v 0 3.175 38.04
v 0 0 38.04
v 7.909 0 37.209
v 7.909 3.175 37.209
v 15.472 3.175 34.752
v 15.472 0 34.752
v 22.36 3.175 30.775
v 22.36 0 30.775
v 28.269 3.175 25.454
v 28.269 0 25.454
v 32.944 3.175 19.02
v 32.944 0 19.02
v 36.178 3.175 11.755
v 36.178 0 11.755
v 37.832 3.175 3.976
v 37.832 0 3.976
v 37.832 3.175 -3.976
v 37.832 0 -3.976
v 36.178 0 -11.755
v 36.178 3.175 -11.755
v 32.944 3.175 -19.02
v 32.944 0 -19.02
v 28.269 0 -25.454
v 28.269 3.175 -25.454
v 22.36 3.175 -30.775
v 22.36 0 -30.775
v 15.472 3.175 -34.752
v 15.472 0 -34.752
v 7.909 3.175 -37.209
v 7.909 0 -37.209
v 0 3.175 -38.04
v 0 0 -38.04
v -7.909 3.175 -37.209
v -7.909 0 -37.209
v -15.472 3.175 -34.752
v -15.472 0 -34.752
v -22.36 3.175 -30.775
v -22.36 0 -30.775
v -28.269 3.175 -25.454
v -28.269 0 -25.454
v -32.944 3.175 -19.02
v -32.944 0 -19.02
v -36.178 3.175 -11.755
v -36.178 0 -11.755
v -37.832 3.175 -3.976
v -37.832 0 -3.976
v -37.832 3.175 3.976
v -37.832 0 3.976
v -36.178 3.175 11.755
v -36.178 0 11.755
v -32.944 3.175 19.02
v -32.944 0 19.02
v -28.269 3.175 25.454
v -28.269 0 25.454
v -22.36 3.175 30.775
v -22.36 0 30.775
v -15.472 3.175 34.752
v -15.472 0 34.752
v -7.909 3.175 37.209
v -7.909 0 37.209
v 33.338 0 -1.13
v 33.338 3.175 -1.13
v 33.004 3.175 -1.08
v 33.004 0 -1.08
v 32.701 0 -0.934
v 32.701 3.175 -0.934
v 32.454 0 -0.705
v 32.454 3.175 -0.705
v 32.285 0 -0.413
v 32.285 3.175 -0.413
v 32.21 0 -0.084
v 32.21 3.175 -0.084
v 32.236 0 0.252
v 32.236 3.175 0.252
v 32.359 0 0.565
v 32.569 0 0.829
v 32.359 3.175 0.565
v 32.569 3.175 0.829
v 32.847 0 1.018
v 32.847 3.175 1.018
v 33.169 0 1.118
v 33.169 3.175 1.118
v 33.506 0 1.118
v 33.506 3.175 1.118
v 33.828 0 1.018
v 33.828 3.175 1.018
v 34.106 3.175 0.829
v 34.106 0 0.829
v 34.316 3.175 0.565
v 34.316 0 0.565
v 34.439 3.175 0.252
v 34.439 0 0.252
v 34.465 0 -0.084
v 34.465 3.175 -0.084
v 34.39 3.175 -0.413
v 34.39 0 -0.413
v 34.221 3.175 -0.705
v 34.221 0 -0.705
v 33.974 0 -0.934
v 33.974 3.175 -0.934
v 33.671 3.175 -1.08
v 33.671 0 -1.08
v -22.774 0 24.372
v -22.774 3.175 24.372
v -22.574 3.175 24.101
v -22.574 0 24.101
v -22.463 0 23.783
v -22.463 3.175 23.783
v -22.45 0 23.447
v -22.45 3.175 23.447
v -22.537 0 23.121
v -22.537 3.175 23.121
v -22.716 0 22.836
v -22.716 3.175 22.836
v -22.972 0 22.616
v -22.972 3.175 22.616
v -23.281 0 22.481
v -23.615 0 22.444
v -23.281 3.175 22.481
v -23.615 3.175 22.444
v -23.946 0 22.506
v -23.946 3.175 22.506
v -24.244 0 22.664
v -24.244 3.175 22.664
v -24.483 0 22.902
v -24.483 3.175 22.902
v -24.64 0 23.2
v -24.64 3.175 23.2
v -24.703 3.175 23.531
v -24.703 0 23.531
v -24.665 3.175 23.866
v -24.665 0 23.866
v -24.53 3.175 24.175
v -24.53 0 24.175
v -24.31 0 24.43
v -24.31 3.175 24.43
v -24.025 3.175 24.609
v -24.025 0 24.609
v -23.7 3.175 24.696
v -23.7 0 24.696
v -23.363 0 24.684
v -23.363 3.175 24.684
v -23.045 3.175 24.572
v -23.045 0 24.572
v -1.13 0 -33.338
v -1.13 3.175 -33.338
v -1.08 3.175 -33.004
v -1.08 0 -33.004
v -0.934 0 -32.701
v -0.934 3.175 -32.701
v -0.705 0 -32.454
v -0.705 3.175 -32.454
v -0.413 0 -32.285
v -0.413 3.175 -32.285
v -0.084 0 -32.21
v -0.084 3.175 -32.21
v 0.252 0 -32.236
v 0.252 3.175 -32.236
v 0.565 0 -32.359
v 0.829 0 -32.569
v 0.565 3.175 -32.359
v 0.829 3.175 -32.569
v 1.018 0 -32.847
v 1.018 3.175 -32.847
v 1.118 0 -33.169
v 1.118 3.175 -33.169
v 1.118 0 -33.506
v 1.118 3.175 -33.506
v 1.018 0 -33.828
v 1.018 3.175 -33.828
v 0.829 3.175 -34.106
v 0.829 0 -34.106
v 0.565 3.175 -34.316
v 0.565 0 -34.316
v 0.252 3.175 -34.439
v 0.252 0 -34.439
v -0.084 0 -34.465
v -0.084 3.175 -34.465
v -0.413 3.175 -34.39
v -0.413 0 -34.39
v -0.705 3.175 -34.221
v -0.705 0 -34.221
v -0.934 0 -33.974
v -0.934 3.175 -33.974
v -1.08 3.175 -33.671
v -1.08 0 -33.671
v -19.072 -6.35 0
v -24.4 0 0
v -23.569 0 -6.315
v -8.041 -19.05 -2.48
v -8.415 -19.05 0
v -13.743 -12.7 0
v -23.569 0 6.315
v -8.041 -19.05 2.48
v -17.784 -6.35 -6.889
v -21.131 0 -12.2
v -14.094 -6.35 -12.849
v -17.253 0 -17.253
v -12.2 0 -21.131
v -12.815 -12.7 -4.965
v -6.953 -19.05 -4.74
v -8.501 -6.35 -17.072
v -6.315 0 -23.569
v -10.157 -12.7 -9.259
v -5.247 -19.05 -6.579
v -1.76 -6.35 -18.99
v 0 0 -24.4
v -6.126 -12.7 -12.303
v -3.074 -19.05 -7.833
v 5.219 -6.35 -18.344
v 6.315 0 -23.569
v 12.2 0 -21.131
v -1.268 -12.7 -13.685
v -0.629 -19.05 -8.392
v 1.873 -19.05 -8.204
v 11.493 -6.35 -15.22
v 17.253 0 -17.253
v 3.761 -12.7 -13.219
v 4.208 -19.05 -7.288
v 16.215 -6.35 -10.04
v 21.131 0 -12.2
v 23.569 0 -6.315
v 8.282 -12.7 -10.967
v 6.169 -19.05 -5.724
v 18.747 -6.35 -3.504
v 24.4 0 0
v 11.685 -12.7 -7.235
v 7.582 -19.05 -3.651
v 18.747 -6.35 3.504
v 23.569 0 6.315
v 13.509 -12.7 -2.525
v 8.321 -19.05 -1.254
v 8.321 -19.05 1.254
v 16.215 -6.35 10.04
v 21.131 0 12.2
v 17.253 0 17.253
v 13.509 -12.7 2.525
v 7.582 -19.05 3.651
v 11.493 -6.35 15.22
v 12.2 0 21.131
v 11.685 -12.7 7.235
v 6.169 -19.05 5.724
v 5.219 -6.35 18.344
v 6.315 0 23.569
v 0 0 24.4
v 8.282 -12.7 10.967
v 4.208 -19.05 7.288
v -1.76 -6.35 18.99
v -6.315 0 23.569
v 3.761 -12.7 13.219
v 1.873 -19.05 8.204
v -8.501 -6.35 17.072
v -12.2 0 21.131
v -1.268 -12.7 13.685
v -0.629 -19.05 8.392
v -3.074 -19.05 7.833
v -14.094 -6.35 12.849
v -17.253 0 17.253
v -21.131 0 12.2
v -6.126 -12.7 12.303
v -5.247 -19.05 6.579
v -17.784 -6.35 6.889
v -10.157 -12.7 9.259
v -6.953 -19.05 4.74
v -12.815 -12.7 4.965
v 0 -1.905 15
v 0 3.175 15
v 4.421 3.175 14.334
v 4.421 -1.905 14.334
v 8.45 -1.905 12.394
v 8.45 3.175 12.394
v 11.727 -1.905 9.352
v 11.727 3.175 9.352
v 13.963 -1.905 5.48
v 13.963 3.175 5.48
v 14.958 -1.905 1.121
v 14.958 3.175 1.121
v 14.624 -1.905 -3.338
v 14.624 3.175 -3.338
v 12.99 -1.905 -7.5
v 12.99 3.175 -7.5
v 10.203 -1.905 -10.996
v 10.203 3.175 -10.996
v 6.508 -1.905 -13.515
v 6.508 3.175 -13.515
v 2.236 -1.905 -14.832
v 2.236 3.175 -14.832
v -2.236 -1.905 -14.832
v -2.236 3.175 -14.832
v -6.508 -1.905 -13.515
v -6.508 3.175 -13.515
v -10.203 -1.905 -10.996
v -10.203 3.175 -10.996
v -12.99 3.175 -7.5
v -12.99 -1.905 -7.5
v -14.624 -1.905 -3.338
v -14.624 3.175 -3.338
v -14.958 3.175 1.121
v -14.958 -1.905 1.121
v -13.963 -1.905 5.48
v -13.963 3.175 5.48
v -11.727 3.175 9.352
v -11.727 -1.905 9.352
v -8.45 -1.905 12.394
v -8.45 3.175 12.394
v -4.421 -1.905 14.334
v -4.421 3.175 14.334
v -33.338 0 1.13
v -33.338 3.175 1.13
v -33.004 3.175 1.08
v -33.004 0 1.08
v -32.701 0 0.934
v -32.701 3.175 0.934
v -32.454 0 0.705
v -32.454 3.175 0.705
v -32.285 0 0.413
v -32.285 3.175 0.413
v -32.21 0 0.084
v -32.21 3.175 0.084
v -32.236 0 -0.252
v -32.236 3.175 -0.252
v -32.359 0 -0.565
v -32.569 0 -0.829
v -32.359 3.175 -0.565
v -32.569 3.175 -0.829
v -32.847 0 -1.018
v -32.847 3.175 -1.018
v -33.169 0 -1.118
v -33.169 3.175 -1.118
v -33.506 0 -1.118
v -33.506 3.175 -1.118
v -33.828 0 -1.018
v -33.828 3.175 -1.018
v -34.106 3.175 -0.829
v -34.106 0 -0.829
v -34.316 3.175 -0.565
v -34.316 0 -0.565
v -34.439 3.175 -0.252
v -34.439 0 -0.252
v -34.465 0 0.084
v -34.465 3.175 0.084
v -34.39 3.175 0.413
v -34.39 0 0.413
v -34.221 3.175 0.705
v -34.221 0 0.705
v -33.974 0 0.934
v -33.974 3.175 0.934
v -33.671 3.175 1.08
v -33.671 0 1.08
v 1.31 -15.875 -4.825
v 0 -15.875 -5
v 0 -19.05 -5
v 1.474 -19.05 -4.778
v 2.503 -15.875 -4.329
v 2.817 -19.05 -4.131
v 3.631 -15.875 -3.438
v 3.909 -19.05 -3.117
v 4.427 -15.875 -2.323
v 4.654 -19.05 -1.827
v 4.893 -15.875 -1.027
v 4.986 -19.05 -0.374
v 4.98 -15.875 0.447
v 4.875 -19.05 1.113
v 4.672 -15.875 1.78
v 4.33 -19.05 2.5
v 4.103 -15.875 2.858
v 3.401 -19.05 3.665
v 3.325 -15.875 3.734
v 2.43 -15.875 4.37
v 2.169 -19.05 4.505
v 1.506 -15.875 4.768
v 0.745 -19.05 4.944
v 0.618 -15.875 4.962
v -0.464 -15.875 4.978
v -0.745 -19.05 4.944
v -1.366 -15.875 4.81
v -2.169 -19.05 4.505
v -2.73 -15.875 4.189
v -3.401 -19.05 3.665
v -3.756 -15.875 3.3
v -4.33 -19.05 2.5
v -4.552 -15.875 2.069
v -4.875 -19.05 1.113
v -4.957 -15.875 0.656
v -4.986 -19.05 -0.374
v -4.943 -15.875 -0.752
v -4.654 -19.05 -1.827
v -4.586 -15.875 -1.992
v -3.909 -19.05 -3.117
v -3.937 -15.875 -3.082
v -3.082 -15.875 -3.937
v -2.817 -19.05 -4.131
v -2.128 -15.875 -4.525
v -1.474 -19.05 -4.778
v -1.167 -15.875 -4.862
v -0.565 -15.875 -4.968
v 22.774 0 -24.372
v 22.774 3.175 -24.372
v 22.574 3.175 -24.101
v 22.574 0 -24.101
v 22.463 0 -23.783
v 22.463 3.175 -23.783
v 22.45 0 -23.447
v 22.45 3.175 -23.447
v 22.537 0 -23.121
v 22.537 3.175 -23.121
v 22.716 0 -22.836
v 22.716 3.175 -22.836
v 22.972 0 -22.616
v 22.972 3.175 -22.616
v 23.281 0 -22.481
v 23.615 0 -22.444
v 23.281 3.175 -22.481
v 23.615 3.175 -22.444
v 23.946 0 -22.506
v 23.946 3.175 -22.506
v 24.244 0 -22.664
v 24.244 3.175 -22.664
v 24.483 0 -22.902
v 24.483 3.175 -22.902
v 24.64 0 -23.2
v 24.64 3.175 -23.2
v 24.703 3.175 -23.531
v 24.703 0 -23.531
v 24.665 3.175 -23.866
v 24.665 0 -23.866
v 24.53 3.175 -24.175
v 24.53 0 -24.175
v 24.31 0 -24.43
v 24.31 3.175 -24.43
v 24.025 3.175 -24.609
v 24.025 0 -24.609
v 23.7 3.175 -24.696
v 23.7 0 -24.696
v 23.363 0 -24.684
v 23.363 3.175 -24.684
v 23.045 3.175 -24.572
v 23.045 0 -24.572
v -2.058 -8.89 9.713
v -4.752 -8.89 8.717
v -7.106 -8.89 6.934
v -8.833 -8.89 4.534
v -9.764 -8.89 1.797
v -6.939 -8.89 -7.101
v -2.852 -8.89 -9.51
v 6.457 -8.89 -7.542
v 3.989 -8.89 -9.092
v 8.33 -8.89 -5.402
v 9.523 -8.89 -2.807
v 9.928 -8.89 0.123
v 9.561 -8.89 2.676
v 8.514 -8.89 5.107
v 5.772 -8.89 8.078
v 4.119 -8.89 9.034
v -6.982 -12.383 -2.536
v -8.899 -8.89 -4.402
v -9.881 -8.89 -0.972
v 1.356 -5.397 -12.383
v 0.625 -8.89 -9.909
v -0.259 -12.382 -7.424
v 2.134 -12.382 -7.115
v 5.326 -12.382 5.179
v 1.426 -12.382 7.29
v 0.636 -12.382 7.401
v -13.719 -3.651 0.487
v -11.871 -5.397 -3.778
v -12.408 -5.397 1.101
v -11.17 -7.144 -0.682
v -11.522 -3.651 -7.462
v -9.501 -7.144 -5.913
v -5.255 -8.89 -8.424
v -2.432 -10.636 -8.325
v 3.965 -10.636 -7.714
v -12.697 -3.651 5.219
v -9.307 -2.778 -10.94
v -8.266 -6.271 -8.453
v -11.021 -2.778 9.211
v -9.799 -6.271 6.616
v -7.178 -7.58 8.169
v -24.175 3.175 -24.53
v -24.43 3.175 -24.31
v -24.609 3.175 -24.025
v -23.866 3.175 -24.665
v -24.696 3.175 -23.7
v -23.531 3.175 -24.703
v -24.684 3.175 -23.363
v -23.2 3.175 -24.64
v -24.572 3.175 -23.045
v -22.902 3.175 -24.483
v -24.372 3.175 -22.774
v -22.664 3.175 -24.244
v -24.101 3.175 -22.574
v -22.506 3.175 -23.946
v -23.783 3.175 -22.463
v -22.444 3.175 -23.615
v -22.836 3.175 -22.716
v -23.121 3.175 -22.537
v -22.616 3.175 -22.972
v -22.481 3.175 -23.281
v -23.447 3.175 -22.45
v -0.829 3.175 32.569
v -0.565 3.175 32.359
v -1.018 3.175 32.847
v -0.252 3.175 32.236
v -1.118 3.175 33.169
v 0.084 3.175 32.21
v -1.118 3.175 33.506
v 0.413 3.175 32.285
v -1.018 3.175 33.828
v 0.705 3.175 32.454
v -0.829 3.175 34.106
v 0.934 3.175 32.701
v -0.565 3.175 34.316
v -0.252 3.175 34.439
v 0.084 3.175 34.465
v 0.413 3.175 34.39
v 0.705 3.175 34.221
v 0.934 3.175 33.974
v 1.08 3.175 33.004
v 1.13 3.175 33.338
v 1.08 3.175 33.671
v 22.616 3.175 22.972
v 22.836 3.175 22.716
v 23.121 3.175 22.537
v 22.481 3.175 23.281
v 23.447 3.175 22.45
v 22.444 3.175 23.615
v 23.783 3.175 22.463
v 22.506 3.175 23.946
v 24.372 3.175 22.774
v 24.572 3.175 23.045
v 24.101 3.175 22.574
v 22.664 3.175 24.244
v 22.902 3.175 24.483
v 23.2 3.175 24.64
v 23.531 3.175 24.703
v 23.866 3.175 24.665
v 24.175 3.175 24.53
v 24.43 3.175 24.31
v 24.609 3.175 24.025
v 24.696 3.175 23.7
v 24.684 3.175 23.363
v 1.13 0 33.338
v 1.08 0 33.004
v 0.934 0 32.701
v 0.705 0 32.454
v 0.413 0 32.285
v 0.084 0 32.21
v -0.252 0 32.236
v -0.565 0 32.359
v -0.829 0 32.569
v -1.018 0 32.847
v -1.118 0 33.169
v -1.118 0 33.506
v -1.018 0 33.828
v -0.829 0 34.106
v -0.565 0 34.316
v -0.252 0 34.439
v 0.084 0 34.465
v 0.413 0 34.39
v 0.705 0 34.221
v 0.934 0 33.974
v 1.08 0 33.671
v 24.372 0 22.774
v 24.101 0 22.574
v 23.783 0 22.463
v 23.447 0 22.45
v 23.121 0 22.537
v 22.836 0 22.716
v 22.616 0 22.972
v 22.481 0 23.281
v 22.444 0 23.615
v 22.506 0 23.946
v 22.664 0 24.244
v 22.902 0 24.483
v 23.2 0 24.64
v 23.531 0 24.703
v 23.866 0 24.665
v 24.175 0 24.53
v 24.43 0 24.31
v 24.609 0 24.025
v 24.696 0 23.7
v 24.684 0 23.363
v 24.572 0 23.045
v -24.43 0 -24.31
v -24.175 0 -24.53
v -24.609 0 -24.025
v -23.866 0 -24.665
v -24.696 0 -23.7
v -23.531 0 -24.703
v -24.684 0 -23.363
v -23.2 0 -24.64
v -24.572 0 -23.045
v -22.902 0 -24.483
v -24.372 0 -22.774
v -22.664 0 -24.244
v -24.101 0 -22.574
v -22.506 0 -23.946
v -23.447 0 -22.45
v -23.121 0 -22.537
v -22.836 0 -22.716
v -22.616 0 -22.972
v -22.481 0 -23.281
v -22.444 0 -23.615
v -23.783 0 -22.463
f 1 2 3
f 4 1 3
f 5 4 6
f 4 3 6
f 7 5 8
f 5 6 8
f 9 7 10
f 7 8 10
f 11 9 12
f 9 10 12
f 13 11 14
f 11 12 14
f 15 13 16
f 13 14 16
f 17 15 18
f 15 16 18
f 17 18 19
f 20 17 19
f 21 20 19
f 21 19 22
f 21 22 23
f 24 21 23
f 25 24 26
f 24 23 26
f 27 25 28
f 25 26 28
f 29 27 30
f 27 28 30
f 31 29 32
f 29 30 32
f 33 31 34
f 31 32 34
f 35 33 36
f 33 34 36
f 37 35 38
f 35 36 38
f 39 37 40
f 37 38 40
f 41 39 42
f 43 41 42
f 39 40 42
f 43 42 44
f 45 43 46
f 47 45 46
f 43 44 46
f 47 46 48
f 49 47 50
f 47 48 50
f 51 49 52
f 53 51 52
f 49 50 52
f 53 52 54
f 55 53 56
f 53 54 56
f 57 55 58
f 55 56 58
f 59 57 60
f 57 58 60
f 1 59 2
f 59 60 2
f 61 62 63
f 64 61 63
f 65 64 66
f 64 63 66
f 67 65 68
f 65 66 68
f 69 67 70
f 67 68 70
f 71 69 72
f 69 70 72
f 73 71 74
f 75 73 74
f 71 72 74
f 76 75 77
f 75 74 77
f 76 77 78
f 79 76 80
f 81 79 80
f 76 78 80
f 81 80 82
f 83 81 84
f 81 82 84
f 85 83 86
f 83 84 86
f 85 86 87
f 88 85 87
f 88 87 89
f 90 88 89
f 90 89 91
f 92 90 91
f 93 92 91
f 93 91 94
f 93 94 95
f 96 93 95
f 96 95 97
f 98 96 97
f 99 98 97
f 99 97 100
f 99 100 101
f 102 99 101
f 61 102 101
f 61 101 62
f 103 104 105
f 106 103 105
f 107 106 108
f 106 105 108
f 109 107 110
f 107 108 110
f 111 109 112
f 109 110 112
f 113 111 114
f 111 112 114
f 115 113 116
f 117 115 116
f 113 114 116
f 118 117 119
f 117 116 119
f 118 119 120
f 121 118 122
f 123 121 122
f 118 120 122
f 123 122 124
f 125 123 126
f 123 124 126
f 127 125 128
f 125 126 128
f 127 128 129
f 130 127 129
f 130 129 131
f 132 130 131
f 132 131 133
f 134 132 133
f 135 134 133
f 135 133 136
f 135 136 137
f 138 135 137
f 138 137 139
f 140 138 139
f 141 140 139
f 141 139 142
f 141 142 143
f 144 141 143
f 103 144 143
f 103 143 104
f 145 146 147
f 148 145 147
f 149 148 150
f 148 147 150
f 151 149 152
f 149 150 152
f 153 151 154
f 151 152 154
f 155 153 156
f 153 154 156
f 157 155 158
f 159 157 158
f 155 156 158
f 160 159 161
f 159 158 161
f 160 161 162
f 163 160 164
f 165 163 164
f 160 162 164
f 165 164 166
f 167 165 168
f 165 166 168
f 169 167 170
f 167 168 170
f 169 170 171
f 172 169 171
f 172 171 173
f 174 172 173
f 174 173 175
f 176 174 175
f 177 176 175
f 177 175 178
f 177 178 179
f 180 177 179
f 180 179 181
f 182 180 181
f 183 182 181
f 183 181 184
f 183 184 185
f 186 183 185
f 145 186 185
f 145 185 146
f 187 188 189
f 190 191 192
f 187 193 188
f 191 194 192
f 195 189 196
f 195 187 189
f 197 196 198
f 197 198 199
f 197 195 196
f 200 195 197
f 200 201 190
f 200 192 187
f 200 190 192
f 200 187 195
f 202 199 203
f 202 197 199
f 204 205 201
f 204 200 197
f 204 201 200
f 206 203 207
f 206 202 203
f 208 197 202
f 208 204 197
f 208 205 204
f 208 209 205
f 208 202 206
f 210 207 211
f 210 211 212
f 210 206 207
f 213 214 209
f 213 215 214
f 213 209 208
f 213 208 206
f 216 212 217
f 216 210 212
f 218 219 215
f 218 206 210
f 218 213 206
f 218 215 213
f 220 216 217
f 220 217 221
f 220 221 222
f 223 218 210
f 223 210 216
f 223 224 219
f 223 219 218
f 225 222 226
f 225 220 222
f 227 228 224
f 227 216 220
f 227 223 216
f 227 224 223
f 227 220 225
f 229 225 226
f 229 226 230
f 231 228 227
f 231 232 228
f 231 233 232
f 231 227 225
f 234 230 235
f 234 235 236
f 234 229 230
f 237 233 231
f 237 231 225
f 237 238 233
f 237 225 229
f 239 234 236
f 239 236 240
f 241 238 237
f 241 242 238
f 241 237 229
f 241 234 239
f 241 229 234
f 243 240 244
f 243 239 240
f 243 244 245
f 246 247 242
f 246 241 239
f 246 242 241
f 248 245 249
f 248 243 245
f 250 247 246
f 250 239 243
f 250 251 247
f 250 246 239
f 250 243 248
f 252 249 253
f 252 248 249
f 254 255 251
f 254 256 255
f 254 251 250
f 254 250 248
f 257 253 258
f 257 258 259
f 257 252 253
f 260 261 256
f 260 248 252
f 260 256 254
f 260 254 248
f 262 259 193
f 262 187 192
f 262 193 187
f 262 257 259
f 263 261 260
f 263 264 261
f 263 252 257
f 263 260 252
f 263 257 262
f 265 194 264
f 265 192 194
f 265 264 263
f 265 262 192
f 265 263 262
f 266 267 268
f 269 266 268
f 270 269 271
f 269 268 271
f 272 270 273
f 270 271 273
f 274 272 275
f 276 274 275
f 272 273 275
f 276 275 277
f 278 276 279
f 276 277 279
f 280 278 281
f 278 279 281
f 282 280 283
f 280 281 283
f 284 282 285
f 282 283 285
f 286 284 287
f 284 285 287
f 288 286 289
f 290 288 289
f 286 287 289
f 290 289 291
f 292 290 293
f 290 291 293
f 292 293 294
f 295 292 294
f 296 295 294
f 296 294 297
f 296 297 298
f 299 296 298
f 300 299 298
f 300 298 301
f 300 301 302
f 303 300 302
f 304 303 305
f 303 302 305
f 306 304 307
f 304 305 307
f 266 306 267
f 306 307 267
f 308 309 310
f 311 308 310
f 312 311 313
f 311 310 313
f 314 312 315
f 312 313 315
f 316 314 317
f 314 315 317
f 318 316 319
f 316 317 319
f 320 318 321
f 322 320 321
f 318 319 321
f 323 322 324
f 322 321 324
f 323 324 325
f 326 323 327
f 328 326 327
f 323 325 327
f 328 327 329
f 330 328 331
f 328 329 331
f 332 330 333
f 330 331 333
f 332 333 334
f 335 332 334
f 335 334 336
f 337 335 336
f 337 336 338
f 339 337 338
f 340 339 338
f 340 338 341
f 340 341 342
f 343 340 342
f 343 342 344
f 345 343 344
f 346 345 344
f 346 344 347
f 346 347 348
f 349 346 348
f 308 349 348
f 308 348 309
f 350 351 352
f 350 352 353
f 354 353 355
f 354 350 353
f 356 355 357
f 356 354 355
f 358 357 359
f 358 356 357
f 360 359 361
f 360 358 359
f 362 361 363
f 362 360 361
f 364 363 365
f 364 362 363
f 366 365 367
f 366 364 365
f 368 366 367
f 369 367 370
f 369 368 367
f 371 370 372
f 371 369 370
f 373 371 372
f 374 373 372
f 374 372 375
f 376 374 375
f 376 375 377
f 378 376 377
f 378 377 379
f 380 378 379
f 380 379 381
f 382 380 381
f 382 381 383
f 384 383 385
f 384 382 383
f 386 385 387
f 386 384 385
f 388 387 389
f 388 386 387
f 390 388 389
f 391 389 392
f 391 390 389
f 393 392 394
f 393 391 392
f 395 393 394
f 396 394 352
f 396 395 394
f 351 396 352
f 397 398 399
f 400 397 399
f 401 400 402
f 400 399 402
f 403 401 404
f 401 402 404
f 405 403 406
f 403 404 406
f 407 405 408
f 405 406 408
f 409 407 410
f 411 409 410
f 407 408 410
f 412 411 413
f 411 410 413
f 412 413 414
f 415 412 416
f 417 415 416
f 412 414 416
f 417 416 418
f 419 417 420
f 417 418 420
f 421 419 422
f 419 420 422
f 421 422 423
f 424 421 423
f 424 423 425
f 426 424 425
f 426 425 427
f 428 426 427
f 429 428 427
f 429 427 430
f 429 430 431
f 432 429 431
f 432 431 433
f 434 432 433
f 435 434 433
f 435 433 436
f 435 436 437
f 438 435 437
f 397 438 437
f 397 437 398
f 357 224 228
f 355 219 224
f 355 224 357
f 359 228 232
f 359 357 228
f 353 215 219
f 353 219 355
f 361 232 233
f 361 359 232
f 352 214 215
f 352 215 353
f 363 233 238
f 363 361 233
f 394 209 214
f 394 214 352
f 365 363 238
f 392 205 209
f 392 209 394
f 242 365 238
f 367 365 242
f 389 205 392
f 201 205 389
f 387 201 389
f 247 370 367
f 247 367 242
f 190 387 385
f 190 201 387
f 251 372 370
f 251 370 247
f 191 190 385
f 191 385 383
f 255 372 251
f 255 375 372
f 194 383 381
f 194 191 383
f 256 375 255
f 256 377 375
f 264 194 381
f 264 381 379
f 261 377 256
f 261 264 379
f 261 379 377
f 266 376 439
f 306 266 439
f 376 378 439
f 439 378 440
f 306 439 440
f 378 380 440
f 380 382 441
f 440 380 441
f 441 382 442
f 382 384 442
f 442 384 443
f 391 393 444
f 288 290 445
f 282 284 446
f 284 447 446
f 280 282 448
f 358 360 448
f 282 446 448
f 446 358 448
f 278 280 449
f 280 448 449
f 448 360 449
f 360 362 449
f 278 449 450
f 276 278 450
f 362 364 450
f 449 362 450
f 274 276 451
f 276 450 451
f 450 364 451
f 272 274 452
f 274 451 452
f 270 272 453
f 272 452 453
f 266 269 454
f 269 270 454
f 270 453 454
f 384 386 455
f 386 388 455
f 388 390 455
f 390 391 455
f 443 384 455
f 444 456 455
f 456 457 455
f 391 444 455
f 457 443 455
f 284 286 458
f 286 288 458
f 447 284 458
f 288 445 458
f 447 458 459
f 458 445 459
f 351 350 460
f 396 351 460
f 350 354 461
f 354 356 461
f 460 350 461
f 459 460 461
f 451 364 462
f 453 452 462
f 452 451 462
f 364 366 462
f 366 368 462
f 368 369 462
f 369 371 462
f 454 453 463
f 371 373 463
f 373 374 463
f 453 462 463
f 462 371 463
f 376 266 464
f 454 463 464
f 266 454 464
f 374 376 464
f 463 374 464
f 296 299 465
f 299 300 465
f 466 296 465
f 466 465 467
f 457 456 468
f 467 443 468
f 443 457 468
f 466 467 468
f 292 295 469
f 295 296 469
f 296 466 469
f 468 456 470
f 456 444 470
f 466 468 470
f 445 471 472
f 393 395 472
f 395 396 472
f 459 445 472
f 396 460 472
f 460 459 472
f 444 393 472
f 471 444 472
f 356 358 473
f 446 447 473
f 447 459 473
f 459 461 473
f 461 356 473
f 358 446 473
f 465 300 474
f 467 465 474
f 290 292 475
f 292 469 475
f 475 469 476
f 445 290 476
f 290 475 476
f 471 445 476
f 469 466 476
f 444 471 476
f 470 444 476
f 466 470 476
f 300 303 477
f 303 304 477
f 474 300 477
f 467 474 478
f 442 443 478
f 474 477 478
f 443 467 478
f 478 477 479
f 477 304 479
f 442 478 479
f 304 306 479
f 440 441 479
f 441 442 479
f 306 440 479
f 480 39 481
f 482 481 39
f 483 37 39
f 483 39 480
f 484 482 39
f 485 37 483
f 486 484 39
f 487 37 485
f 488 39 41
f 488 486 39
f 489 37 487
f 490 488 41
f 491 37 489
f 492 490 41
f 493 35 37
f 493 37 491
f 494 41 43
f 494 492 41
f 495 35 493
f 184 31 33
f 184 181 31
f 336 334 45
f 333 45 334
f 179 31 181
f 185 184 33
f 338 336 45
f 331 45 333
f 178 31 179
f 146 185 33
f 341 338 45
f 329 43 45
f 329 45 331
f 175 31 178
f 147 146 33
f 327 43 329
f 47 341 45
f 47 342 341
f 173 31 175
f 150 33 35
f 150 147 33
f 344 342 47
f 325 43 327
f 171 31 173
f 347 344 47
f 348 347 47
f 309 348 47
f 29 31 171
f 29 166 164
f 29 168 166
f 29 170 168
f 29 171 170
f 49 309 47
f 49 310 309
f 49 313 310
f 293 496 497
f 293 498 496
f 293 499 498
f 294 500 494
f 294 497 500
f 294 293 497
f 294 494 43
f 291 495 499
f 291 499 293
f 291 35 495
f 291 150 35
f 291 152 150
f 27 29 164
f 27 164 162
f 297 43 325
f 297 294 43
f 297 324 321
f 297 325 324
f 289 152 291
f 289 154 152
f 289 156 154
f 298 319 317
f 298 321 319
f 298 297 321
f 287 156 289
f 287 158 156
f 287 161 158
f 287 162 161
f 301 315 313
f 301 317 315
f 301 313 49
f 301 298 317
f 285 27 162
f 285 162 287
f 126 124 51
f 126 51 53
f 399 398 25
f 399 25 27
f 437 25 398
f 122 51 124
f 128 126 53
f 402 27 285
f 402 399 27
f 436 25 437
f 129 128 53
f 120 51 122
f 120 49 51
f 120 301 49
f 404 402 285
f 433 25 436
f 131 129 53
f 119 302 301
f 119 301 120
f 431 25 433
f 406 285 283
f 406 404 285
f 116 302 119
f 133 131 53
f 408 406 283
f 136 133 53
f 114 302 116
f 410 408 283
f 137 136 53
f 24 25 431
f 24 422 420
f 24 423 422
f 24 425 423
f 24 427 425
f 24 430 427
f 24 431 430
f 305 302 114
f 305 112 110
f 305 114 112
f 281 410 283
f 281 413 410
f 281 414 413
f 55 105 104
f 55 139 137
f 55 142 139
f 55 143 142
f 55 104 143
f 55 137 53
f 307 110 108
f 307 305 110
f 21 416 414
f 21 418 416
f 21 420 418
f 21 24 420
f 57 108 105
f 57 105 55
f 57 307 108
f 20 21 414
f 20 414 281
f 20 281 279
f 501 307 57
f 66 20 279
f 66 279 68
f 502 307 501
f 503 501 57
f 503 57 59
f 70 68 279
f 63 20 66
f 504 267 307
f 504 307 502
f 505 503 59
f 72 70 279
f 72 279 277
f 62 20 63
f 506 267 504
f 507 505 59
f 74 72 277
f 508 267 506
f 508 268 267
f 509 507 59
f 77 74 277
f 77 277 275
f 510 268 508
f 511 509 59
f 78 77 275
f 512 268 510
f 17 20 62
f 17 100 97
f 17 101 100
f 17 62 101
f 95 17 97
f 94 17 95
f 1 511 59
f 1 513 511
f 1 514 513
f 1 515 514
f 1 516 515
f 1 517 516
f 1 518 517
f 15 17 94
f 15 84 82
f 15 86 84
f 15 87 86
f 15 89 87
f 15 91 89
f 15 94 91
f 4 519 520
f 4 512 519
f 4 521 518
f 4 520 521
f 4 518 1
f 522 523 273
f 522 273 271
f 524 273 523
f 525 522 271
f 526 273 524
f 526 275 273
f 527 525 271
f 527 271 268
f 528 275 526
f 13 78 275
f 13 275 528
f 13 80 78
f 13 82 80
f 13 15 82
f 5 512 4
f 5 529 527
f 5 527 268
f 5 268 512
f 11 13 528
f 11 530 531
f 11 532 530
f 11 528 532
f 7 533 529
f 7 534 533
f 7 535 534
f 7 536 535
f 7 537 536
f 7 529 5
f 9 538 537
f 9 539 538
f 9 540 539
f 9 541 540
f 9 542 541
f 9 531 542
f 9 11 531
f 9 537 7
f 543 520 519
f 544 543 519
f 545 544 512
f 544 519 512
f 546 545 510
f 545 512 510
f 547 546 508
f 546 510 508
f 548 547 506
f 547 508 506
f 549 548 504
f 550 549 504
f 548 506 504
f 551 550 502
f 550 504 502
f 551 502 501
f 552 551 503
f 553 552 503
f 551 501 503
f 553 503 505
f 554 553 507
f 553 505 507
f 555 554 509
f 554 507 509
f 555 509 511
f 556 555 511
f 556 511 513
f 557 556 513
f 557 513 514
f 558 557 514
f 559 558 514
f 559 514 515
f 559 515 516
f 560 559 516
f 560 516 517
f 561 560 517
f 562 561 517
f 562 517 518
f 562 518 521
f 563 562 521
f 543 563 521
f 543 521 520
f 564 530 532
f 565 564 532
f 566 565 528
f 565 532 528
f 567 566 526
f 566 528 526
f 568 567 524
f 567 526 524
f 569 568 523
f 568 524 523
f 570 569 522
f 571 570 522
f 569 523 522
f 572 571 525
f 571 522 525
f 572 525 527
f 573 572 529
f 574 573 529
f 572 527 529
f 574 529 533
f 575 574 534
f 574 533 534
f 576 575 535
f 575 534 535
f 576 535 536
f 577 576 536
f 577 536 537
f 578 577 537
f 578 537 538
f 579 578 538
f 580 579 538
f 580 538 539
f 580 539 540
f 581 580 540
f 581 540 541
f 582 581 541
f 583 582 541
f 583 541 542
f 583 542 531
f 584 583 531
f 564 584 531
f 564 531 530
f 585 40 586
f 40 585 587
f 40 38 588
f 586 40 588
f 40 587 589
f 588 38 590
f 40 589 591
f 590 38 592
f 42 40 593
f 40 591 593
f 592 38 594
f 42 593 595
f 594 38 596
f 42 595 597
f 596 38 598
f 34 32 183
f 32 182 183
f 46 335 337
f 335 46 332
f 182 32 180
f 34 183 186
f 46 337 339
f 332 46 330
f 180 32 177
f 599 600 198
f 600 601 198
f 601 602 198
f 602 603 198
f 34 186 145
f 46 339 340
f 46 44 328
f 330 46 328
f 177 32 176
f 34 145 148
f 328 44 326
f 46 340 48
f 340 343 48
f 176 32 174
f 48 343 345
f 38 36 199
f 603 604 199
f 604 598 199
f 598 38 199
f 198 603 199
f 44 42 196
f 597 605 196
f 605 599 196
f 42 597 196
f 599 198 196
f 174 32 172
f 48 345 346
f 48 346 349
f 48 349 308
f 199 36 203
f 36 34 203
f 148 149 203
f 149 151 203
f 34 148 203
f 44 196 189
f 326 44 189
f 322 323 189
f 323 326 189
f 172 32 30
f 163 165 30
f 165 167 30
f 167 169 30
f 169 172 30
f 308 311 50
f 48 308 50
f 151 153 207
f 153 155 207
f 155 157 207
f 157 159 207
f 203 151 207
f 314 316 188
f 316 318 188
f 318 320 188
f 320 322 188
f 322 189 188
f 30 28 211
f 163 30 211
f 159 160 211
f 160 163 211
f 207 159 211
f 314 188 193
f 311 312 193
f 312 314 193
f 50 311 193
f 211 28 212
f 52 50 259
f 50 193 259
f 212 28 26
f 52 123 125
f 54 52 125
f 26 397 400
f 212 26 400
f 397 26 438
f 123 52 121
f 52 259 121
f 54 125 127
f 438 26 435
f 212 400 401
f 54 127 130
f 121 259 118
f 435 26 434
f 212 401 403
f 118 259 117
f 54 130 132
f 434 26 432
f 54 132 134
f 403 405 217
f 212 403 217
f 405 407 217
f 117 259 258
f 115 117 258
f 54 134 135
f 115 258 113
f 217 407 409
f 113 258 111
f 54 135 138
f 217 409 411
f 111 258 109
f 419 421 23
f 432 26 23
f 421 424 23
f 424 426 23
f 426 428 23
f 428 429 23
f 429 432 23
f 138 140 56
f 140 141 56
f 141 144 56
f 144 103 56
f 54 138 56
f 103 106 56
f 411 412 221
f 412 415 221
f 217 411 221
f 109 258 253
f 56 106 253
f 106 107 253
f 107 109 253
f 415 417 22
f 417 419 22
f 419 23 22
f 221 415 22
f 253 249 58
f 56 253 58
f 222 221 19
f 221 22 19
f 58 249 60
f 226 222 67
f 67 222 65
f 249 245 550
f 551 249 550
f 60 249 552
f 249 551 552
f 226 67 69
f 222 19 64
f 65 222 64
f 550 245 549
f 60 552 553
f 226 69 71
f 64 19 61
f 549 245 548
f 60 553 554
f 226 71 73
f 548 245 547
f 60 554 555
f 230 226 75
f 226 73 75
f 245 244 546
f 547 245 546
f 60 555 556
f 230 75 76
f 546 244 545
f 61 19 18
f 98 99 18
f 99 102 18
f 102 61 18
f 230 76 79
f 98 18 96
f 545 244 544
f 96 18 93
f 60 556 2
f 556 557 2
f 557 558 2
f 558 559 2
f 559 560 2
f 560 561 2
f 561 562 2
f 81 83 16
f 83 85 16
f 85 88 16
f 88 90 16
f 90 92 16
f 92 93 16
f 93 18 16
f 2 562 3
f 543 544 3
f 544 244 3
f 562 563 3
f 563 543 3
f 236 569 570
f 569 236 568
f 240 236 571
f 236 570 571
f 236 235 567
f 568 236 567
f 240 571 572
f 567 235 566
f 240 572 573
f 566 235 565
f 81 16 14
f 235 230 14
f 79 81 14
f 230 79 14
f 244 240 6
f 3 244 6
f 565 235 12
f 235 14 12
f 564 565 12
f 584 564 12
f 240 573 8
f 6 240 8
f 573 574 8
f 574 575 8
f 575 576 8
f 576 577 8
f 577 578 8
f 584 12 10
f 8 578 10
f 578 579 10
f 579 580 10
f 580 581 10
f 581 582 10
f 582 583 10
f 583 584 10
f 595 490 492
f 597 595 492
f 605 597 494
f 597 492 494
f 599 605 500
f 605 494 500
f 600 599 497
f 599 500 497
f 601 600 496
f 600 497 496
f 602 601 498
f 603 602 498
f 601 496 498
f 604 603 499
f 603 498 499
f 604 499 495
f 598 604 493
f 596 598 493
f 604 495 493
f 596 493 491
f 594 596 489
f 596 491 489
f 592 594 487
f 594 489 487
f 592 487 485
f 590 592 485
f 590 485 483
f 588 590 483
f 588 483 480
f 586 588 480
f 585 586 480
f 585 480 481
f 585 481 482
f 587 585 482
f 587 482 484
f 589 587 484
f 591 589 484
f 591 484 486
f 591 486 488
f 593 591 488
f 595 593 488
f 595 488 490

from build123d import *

# Parameters (mm, degrees)
SKETCH1_R                 = 38.04031
BOSS_EXTRUDE1_DEPTH       = 3.175
TAP_DRILL_FOR_4_40_TAP1_D = 2.2606
CIRPATTERN1_COUNT         = 8
SKETCH5_R                 = 25.4
BOSS_EXTRUDE2_DEPTH       = 19.05
CUT_EXTRUDE1_DEPTH        = 59.207224593
CUT_EXTRUDE1_DEPTH_BACK   = 59.207224593
SKETCH6_R                 = 5
SKETCH7_R                 = 15
CUT_EXTRUDE2_DEPTH        = 5.08


with BuildPart() as part:
    # Sketch1 → Boss-Extrude1 (new body)
    with BuildSketch(Plane(origin=(0, 0, 0), x_dir=(1, 0, 0), z_dir=(0, 1, 0))):
        with Locations(Location((0, 0, 0), (0, 0, 270))):
            Circle(SKETCH1_R)
    extrude(amount=BOSS_EXTRUDE1_DEPTH)

    # Tap Drill for #4-40 Tap1 (through all)
    with Locations(Plane(origin=(0, 0, 0), x_dir=(-1, 0, 0), z_dir=(0, -1, 0))):
        with Locations((0, -33.3375)):
            tap_drill_for_4_40_tap1 = Hole(TAP_DRILL_FOR_4_40_TAP1_D / 2)

    # CirPattern1: Tap Drill for #4-40 Tap1 ×8 about axis
    cirpattern1_axis = Axis((0, 0, 0), (0, 1, 0))
    for i in range(1, CIRPATTERN1_COUNT):
        add(tap_drill_for_4_40_tap1.rotate(cirpattern1_axis, i * 360 / CIRPATTERN1_COUNT), mode=Mode.SUBTRACT)

    # Sketch5 → Boss-Extrude2 (add)
    with BuildSketch(Plane.XZ):
        with Locations(Location((0, 0, 0), (0, 0, 90))):
            Circle(SKETCH5_R)
    extrude(amount=BOSS_EXTRUDE2_DEPTH)

    # Sketch6 → Cut-Extrude1 (cut, two sides: drawn at the far end of the back side and taken through both)
    with BuildSketch(Plane.XZ.offset(19.05).offset(-CUT_EXTRUDE1_DEPTH_BACK)):
        with Locations(Location((0, 0, 0), (0, 0, 270))):
            Circle(SKETCH6_R)
    extrude(amount=CUT_EXTRUDE1_DEPTH + CUT_EXTRUDE1_DEPTH_BACK, mode=Mode.SUBTRACT)

    # Sketch7 → Cut-Extrude2 (cut)
    with BuildSketch(Plane(origin=(0, 3.175, 0), x_dir=(1, 0, 0), z_dir=(0, 1, 0))):
        with Locations(Location((0, 0, 0), (0, 0, 270))):
            Circle(SKETCH7_R)
    extrude(amount=-CUT_EXTRUDE2_DEPTH, mode=Mode.SUBTRACT)

    # Cut-Loft1: read off the stored shape, not the designer's step
    # Cut-Loft1: loft between two sections, ruled curve by curve
    cut_loft1_from = [
        Edge.make_bspline([(0, -1.905, 15), (-30, -1.905, 15), (-30, -1.905, -15), (0, -1.905, -15), (30, -1.905, -15), (30, -1.905, 15), (0, -1.905, 15)], [0, 0, 0, 0, 0.5, 0.5, 0.5, 1, 1, 1, 1], 3, [1, 0.333333333, 0.333333333, 1, 0.333333333, 0.333333333, 1]),
    ]
    cut_loft1_to = [
        Edge.make_bspline([(-1.365853626, -15.875, 4.809827842), (-10.985509311, -15.875, 2.07812059), (-8.253802058, -15.875, -7.541535095), (1.365853626, -15.875, -4.809827842), (10.985509311, -15.875, -2.07812059), (8.253802058, -15.875, 7.541535095), (-1.365853626, -15.875, 4.809827842)], [0, 0, 0, 0, 0.5, 0.5, 0.5, 1, 1, 1, 1], 3, [1, 0.333333333, 0.333333333, 1, 0.333333333, 0.333333333, 1]),
    ]
    cut_loft1 = Solid(Shell([*[Face.make_surface_from_curves(cut_loft1_from[k], cut_loft1_to[k]) for k in range(1)], Face(Wire(cut_loft1_from)), Face(Wire(cut_loft1_to))]))
    add(cut_loft1, mode=Mode.SUBTRACT)

    # Sketch10 → Cut-Revolve1 (revolve, cut)
    with BuildSketch(Plane.XY):
        Polygon((-25.4, 0), (-24.4, 0), (-8.415152026, -19.05), (-25.4, -19.05), align=None)
    revolve(axis=Axis((0, 0, 0), (0, -1, 0)), mode=Mode.SUBTRACT)


solid = part.part
